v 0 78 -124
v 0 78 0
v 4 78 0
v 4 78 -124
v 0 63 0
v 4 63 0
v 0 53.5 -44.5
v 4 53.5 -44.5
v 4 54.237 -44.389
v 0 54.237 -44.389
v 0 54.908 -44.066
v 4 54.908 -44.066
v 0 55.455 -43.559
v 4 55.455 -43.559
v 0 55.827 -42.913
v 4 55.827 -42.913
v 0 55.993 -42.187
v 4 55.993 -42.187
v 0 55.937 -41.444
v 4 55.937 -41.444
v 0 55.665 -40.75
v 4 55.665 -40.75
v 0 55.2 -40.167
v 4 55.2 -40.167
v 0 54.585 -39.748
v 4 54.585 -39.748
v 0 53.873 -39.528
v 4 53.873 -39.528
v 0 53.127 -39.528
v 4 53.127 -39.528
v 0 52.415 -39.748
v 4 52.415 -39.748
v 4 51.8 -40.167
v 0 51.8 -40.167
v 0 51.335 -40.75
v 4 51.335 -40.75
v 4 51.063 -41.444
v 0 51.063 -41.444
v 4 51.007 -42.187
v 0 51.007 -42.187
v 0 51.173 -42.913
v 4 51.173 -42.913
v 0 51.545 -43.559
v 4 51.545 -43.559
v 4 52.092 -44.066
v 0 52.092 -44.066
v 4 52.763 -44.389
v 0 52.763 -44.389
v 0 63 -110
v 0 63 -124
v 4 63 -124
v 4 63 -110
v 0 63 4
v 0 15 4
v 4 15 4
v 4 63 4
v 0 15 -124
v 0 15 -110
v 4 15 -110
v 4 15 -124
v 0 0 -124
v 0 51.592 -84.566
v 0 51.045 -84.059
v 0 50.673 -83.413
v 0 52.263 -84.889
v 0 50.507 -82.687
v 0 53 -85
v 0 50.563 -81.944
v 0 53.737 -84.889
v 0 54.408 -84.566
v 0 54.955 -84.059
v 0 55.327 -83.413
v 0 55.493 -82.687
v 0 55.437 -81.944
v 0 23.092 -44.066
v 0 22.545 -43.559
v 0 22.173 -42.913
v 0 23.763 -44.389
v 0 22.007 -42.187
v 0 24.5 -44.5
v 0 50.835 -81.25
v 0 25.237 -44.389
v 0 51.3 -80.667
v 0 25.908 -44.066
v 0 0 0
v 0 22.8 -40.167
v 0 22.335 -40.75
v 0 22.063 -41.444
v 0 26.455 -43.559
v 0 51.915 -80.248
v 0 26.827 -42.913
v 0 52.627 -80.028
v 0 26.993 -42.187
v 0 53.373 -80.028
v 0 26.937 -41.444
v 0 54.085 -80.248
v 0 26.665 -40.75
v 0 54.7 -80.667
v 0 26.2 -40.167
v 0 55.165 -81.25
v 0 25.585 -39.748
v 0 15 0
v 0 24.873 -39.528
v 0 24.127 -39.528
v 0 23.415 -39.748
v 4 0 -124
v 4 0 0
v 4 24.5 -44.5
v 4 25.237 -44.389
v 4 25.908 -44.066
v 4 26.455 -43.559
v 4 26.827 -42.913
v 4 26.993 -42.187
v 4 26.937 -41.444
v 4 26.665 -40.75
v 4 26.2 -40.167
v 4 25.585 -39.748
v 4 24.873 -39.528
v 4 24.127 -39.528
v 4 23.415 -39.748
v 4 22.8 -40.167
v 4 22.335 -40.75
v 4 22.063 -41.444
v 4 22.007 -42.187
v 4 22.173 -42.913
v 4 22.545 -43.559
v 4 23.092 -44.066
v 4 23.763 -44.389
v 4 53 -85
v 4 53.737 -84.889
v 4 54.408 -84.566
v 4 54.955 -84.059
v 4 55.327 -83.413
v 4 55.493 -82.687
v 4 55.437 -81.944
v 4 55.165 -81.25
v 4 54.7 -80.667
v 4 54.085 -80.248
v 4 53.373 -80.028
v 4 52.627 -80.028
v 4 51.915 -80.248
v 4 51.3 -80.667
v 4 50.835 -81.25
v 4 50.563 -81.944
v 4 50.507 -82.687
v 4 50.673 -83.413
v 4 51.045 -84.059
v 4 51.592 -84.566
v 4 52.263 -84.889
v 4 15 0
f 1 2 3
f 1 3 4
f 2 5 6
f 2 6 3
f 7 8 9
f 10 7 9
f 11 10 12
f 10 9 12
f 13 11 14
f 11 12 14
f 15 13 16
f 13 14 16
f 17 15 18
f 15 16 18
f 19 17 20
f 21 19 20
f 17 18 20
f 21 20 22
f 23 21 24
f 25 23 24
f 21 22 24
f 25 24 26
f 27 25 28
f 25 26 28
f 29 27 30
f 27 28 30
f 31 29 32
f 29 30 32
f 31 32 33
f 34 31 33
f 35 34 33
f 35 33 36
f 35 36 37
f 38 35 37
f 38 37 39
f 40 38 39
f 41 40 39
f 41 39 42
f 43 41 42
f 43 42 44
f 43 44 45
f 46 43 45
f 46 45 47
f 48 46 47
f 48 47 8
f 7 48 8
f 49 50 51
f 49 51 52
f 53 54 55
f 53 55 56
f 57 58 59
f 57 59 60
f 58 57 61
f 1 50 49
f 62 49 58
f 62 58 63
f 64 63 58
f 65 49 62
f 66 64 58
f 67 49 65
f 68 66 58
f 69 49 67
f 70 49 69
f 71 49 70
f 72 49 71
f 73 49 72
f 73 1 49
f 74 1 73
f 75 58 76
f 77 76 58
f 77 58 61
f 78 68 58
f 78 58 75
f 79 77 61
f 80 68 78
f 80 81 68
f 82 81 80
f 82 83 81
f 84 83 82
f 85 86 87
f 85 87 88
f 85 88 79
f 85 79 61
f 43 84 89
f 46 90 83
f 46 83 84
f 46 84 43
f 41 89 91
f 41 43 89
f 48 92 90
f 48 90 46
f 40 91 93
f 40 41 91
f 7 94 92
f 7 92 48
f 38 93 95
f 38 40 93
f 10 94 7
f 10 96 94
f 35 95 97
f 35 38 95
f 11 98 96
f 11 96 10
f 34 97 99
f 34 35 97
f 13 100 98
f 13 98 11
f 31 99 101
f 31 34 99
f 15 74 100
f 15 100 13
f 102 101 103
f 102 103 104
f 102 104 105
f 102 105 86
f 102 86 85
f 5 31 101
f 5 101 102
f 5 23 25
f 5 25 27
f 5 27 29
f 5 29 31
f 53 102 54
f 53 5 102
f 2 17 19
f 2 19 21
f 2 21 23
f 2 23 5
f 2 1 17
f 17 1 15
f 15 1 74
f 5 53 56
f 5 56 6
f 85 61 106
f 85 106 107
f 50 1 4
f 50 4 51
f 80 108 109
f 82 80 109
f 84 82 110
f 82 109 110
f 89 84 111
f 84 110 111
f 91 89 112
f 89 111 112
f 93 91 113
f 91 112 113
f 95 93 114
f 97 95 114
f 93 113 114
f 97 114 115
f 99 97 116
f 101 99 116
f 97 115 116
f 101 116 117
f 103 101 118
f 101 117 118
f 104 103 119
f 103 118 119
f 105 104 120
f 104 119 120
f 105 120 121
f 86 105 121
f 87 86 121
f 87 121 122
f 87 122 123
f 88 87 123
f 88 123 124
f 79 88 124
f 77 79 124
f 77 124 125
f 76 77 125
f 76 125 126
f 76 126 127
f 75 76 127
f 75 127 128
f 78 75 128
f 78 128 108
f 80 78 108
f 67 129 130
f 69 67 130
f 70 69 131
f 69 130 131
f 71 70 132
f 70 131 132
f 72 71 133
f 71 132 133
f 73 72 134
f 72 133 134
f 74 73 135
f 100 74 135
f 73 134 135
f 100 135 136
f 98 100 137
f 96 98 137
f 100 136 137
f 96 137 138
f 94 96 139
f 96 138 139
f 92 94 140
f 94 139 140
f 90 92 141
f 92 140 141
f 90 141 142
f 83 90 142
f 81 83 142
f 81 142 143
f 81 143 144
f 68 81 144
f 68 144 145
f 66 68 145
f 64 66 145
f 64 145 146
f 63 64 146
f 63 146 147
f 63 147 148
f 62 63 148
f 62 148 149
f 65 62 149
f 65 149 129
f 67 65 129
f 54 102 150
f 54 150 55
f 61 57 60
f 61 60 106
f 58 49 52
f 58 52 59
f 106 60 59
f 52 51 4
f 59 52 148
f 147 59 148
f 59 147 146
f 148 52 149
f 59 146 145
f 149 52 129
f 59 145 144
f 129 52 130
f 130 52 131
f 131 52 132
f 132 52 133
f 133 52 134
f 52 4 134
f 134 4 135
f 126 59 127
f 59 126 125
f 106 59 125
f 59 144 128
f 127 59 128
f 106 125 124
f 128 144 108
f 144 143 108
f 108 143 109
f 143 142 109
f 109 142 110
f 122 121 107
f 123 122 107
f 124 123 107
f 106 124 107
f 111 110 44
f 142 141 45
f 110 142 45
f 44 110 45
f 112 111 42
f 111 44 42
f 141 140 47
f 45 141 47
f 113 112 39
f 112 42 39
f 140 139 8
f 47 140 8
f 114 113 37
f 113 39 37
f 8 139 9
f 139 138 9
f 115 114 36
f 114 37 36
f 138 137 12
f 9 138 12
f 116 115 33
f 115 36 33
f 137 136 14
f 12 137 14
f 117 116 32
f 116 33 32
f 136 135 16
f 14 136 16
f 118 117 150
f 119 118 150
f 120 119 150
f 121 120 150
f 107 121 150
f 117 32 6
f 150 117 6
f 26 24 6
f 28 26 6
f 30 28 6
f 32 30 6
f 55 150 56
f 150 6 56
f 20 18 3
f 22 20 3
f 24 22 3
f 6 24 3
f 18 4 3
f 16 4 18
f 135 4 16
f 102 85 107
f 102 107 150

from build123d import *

# Parameters (mm, degrees)
BOSS_EXTRUDE1_DEPTH = 4
SKETCH2_R           = 2.5
CUT_EXTRUDE1_DEPTH  = 147.546920814


with BuildPart() as part:
    # Sketch1 → Boss-Extrude1 (new body)
    with BuildSketch(Plane(origin=(0, 0, 0), x_dir=(0, 0, -1), z_dir=(1, 0, 0))):
        Polygon((0, 63), (0, 78), (124, 78), (124, 63), (110, 63), (110, 15), (124, 15), (124, 0), (0, 0), (0, 15), (-4, 15), (-4, 63), align=None)
    extrude(amount=BOSS_EXTRUDE1_DEPTH)

    # Sketch2 → Cut-Extrude1 (cut, through all)
    with BuildSketch(Plane(origin=(4, 0, 0), x_dir=(0, 0, -1), z_dir=(1, 0, 0))):
        with Locations((42, 24.5)):
            Circle(SKETCH2_R)
        with Locations((42, 53.5)):
            Circle(SKETCH2_R)
        with Locations((82.5, 53)):
            Circle(SKETCH2_R)
    extrude(amount=-CUT_EXTRUDE1_DEPTH, mode=Mode.SUBTRACT)


solid = part.part
